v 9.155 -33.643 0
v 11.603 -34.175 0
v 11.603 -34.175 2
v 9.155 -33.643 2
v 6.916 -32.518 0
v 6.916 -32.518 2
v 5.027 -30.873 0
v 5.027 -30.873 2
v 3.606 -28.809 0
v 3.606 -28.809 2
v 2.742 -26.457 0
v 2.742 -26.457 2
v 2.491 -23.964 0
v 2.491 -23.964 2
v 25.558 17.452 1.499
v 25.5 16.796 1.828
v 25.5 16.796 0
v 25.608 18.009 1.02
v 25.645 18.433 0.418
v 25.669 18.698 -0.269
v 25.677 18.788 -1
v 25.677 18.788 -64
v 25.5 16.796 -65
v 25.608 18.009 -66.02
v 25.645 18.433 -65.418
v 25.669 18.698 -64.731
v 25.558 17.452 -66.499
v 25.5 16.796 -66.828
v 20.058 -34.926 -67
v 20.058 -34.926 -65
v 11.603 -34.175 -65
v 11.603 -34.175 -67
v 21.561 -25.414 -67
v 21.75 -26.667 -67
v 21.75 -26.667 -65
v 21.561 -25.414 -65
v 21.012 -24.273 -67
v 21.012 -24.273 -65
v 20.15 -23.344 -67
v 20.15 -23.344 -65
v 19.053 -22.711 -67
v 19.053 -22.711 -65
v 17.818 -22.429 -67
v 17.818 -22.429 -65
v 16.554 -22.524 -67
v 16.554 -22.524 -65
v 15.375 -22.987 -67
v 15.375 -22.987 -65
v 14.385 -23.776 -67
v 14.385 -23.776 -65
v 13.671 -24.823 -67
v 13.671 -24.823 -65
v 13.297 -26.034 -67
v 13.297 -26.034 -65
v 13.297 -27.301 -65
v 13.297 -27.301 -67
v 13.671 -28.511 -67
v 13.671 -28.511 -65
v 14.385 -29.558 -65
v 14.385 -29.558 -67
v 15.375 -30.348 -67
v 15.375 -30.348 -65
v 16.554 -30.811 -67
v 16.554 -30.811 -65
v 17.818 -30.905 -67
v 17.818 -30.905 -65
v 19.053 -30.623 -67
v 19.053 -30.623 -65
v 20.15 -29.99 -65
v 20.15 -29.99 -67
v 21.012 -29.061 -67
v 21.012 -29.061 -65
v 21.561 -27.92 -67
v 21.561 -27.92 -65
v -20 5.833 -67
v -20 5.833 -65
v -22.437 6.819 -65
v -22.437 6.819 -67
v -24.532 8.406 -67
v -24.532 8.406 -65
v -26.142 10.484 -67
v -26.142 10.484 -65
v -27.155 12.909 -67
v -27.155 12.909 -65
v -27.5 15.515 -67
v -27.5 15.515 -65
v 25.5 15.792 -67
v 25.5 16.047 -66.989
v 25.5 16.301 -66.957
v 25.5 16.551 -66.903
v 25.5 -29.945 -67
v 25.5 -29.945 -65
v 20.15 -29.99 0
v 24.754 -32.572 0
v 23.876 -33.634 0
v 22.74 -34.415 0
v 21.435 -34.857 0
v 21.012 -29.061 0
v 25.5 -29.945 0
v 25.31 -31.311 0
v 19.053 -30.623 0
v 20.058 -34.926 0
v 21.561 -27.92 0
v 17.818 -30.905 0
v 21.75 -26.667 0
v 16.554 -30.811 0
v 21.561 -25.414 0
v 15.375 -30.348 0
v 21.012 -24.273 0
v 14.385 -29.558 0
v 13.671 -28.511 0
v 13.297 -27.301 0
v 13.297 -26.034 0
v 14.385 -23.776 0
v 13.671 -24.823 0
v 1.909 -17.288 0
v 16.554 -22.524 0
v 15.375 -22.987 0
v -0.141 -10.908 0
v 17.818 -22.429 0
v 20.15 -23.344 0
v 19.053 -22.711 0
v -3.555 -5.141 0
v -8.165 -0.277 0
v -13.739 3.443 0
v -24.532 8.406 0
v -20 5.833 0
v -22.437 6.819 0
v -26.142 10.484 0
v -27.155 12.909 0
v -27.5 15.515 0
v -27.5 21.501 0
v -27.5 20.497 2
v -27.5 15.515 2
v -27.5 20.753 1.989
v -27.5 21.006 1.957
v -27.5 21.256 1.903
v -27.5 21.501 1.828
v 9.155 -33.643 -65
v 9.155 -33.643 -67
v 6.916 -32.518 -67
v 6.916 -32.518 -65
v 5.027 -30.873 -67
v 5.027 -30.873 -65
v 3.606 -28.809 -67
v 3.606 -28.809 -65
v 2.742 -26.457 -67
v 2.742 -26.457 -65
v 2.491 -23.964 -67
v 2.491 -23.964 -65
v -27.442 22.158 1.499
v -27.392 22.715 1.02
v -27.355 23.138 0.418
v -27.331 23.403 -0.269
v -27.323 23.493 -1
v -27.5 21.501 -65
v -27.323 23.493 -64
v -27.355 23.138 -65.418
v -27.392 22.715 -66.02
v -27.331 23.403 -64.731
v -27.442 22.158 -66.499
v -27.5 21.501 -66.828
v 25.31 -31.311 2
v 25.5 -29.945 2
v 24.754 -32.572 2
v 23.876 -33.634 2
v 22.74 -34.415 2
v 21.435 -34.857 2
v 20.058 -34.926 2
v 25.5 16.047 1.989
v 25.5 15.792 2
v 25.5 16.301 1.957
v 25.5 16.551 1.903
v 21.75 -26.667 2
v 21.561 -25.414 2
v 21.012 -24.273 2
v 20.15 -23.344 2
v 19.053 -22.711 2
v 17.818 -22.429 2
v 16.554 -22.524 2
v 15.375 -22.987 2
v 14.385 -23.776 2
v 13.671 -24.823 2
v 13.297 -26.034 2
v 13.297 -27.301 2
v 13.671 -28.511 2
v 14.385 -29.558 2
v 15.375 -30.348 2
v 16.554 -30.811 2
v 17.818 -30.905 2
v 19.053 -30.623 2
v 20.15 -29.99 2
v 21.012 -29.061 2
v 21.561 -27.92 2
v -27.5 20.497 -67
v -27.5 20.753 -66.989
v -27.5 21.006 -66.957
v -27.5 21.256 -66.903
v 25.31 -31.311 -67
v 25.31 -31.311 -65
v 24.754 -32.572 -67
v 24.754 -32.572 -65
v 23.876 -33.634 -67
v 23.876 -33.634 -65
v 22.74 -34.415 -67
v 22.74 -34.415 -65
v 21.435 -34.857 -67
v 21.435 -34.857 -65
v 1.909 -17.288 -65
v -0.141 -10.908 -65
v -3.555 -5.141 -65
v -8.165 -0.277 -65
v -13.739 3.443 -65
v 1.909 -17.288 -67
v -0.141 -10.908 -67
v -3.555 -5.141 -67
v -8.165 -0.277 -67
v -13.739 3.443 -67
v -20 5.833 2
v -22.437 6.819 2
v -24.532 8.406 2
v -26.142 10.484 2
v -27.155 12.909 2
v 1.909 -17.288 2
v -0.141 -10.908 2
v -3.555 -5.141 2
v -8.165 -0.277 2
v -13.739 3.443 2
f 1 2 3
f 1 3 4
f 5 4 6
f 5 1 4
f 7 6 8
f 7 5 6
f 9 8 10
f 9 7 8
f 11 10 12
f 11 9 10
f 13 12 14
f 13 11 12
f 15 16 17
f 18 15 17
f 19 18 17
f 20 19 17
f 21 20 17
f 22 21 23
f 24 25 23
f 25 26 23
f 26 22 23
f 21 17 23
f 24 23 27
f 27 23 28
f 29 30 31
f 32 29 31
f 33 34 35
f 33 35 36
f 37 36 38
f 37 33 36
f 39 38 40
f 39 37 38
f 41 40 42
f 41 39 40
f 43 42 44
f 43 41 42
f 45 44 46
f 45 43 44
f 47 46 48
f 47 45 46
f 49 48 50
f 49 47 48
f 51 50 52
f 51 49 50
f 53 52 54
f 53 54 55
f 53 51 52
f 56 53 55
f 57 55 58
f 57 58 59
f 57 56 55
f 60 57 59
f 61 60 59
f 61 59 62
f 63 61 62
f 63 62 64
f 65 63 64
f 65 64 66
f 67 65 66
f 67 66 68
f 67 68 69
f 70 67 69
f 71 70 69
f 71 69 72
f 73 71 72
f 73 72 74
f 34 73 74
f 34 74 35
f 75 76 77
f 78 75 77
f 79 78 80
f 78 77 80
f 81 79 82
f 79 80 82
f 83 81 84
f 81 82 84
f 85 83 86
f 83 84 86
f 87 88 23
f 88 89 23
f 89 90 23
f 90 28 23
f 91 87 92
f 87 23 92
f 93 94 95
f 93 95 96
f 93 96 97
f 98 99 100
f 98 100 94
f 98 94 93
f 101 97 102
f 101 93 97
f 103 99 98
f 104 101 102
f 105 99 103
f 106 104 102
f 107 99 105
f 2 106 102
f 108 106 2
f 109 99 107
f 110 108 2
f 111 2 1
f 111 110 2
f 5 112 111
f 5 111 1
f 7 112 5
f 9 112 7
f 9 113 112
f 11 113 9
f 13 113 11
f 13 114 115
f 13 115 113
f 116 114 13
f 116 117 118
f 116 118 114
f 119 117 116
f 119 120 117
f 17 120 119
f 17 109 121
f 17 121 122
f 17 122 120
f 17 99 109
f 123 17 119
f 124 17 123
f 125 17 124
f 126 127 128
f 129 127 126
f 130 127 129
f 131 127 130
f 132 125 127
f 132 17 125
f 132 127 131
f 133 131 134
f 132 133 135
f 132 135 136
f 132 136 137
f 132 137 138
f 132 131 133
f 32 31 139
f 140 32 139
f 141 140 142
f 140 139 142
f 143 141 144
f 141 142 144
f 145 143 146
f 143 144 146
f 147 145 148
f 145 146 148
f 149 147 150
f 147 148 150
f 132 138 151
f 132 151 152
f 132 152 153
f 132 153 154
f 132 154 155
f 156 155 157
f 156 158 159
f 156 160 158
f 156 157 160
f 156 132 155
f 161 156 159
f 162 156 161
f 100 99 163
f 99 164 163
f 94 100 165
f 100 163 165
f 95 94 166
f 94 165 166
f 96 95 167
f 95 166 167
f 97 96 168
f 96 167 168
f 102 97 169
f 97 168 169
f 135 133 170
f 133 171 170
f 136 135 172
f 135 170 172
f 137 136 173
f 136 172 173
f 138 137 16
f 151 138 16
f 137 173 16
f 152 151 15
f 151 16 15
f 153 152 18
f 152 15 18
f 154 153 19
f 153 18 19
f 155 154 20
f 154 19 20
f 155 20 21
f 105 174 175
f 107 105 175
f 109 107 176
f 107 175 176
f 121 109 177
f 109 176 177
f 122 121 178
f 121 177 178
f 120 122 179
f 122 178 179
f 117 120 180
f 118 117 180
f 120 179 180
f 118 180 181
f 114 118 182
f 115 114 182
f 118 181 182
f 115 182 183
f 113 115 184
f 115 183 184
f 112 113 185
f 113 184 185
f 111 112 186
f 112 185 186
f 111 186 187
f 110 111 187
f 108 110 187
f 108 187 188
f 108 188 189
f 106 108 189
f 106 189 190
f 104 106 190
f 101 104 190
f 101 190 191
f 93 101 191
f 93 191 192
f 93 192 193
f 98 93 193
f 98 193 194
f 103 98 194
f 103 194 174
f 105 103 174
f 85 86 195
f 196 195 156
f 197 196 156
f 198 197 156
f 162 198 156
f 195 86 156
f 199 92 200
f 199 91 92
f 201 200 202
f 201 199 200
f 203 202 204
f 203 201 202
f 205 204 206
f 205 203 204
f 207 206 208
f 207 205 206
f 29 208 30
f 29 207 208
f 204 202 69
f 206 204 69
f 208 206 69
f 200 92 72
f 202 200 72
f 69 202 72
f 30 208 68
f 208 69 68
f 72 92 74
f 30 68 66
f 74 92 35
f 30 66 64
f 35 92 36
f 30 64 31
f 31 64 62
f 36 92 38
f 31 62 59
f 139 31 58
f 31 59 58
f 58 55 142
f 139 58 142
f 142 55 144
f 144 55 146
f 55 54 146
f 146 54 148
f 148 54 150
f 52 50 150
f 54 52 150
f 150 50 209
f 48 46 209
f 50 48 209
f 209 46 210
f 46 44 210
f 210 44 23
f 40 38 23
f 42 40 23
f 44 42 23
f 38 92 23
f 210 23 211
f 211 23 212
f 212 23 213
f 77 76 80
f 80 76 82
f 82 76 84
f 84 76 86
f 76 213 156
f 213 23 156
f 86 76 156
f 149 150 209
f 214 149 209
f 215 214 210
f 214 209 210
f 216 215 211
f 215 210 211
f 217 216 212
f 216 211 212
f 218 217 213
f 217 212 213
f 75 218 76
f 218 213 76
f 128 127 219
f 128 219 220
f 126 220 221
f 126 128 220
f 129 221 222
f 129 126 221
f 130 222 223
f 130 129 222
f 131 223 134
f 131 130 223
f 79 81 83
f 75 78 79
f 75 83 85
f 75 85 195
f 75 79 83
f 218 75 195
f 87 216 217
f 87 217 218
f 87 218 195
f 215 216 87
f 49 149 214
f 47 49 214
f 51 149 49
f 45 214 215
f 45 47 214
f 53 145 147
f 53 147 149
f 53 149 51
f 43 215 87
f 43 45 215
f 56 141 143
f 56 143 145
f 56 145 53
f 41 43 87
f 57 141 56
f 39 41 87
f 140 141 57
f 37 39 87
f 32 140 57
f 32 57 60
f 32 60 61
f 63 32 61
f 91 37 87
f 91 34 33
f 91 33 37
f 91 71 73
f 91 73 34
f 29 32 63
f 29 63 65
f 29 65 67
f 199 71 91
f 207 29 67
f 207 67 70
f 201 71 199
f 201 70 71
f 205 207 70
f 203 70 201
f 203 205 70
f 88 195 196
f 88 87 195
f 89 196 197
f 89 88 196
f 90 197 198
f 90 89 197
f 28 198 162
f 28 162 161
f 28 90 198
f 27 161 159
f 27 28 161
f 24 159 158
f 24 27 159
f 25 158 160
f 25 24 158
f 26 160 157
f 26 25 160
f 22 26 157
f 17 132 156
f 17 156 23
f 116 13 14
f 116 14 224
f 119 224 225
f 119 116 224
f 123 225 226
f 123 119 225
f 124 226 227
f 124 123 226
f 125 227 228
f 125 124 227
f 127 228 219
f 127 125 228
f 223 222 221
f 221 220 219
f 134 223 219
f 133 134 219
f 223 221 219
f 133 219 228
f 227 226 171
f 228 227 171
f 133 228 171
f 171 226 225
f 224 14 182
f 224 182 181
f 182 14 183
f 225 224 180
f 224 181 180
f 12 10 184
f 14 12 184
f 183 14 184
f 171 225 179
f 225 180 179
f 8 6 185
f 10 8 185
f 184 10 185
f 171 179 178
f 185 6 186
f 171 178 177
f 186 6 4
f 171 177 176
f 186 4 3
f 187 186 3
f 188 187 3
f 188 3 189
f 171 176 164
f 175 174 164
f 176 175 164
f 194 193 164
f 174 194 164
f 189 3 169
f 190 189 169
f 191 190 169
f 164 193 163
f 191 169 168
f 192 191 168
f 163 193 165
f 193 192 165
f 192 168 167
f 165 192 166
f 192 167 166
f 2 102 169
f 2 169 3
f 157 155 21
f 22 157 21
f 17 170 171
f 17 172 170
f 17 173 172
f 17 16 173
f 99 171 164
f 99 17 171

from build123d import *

# Parameters (mm, degrees)
BOSS_EXTRUDE1_DEPTH = 2
FILLET1_R           = 5
SKETCH2_R           = 4.25
CUT_EXTRUDE1_DEPTH  = 10
SKETCH3_W           = 53.20846293
SKETCH3_H           = 69
BOSS_EXTRUDE2_DEPTH = 2
FILLET2_R           = 3


with BuildPart() as part:
    # Sketch1 → Boss-Extrude1 (new body)
    with BuildSketch(Plane.XY):
        with BuildLine():
            Line((-27.5, 15.515231625), (-27.5, 21.501022606))
            Line((-27.5, 21.501022606), (25.5, 16.795650425))
            Line((25.5, 16.795650425), (25.5, -35.408879242))
            Line((25.5, -35.408879242), (11.603178078, -34.175110954))
            ThreePointArc((11.603178078, -34.175110954), (5.026609694, -30.872744893), (2.490629392, -23.964367571))
            ThreePointArc((2.490629392, -23.964367571), (-3.555183787, -5.141257472), (-20, 5.83277326))
            ThreePointArc((-20, 5.83277326), (-25.40569415, 9.391507269), (-27.5, 15.515231625))
        make_face()
    extrude(amount=BOSS_EXTRUDE1_DEPTH)

    # Fillet1
    fillet1_edges = [part.edges().sort_by_distance(p)[0] for p in [
        (25.5, -35.408879242, 1),
    ]]
    fillet(fillet1_edges, radius=FILLET1_R)

    # Sketch2 → Cut-Extrude1 (cut)
    with BuildSketch(Plane.XY.offset(2)):
        with Locations((17.5, -26.667168282)):
            Circle(SKETCH2_R)
    extrude(amount=-CUT_EXTRUDE1_DEPTH, mode=Mode.SUBTRACT)


with BuildPart() as body_2:
    # Mirror3: mirrored copy
    add(part.part.mirror(Plane(origin=(0, 0, -32.5), x_dir=(1, 0, 0), z_dir=(0, 0, -1))))


with BuildPart() as part_1:
    add(part.part)

    add(body_2.part)  # Boss-Extrude2 merges body 2
    # Sketch3 → Boss-Extrude2 (add)
    with BuildSketch(Plane(origin=(1.678885973, 18.910503392, 0), x_dir=(0.9960821471166026, -0.08843277783479815, 0), z_dir=(0.08843277783479815, 0.9960821471166027, 0))):
        with Locations((-2.689422736, 32.5)):
            Rectangle(SKETCH3_W, SKETCH3_H)
    extrude(amount=BOSS_EXTRUDE2_DEPTH)

    # Fillet2
    fillet2_edges = [part_1.edges().sort_by_distance(p)[0] for p in [
        (-0.823134444, 21.140500809, 2),
        (-0.823134444, 21.140500809, -67),
    ]]
    fillet(fillet2_edges, radius=FILLET2_R)


solid = part_1.part
